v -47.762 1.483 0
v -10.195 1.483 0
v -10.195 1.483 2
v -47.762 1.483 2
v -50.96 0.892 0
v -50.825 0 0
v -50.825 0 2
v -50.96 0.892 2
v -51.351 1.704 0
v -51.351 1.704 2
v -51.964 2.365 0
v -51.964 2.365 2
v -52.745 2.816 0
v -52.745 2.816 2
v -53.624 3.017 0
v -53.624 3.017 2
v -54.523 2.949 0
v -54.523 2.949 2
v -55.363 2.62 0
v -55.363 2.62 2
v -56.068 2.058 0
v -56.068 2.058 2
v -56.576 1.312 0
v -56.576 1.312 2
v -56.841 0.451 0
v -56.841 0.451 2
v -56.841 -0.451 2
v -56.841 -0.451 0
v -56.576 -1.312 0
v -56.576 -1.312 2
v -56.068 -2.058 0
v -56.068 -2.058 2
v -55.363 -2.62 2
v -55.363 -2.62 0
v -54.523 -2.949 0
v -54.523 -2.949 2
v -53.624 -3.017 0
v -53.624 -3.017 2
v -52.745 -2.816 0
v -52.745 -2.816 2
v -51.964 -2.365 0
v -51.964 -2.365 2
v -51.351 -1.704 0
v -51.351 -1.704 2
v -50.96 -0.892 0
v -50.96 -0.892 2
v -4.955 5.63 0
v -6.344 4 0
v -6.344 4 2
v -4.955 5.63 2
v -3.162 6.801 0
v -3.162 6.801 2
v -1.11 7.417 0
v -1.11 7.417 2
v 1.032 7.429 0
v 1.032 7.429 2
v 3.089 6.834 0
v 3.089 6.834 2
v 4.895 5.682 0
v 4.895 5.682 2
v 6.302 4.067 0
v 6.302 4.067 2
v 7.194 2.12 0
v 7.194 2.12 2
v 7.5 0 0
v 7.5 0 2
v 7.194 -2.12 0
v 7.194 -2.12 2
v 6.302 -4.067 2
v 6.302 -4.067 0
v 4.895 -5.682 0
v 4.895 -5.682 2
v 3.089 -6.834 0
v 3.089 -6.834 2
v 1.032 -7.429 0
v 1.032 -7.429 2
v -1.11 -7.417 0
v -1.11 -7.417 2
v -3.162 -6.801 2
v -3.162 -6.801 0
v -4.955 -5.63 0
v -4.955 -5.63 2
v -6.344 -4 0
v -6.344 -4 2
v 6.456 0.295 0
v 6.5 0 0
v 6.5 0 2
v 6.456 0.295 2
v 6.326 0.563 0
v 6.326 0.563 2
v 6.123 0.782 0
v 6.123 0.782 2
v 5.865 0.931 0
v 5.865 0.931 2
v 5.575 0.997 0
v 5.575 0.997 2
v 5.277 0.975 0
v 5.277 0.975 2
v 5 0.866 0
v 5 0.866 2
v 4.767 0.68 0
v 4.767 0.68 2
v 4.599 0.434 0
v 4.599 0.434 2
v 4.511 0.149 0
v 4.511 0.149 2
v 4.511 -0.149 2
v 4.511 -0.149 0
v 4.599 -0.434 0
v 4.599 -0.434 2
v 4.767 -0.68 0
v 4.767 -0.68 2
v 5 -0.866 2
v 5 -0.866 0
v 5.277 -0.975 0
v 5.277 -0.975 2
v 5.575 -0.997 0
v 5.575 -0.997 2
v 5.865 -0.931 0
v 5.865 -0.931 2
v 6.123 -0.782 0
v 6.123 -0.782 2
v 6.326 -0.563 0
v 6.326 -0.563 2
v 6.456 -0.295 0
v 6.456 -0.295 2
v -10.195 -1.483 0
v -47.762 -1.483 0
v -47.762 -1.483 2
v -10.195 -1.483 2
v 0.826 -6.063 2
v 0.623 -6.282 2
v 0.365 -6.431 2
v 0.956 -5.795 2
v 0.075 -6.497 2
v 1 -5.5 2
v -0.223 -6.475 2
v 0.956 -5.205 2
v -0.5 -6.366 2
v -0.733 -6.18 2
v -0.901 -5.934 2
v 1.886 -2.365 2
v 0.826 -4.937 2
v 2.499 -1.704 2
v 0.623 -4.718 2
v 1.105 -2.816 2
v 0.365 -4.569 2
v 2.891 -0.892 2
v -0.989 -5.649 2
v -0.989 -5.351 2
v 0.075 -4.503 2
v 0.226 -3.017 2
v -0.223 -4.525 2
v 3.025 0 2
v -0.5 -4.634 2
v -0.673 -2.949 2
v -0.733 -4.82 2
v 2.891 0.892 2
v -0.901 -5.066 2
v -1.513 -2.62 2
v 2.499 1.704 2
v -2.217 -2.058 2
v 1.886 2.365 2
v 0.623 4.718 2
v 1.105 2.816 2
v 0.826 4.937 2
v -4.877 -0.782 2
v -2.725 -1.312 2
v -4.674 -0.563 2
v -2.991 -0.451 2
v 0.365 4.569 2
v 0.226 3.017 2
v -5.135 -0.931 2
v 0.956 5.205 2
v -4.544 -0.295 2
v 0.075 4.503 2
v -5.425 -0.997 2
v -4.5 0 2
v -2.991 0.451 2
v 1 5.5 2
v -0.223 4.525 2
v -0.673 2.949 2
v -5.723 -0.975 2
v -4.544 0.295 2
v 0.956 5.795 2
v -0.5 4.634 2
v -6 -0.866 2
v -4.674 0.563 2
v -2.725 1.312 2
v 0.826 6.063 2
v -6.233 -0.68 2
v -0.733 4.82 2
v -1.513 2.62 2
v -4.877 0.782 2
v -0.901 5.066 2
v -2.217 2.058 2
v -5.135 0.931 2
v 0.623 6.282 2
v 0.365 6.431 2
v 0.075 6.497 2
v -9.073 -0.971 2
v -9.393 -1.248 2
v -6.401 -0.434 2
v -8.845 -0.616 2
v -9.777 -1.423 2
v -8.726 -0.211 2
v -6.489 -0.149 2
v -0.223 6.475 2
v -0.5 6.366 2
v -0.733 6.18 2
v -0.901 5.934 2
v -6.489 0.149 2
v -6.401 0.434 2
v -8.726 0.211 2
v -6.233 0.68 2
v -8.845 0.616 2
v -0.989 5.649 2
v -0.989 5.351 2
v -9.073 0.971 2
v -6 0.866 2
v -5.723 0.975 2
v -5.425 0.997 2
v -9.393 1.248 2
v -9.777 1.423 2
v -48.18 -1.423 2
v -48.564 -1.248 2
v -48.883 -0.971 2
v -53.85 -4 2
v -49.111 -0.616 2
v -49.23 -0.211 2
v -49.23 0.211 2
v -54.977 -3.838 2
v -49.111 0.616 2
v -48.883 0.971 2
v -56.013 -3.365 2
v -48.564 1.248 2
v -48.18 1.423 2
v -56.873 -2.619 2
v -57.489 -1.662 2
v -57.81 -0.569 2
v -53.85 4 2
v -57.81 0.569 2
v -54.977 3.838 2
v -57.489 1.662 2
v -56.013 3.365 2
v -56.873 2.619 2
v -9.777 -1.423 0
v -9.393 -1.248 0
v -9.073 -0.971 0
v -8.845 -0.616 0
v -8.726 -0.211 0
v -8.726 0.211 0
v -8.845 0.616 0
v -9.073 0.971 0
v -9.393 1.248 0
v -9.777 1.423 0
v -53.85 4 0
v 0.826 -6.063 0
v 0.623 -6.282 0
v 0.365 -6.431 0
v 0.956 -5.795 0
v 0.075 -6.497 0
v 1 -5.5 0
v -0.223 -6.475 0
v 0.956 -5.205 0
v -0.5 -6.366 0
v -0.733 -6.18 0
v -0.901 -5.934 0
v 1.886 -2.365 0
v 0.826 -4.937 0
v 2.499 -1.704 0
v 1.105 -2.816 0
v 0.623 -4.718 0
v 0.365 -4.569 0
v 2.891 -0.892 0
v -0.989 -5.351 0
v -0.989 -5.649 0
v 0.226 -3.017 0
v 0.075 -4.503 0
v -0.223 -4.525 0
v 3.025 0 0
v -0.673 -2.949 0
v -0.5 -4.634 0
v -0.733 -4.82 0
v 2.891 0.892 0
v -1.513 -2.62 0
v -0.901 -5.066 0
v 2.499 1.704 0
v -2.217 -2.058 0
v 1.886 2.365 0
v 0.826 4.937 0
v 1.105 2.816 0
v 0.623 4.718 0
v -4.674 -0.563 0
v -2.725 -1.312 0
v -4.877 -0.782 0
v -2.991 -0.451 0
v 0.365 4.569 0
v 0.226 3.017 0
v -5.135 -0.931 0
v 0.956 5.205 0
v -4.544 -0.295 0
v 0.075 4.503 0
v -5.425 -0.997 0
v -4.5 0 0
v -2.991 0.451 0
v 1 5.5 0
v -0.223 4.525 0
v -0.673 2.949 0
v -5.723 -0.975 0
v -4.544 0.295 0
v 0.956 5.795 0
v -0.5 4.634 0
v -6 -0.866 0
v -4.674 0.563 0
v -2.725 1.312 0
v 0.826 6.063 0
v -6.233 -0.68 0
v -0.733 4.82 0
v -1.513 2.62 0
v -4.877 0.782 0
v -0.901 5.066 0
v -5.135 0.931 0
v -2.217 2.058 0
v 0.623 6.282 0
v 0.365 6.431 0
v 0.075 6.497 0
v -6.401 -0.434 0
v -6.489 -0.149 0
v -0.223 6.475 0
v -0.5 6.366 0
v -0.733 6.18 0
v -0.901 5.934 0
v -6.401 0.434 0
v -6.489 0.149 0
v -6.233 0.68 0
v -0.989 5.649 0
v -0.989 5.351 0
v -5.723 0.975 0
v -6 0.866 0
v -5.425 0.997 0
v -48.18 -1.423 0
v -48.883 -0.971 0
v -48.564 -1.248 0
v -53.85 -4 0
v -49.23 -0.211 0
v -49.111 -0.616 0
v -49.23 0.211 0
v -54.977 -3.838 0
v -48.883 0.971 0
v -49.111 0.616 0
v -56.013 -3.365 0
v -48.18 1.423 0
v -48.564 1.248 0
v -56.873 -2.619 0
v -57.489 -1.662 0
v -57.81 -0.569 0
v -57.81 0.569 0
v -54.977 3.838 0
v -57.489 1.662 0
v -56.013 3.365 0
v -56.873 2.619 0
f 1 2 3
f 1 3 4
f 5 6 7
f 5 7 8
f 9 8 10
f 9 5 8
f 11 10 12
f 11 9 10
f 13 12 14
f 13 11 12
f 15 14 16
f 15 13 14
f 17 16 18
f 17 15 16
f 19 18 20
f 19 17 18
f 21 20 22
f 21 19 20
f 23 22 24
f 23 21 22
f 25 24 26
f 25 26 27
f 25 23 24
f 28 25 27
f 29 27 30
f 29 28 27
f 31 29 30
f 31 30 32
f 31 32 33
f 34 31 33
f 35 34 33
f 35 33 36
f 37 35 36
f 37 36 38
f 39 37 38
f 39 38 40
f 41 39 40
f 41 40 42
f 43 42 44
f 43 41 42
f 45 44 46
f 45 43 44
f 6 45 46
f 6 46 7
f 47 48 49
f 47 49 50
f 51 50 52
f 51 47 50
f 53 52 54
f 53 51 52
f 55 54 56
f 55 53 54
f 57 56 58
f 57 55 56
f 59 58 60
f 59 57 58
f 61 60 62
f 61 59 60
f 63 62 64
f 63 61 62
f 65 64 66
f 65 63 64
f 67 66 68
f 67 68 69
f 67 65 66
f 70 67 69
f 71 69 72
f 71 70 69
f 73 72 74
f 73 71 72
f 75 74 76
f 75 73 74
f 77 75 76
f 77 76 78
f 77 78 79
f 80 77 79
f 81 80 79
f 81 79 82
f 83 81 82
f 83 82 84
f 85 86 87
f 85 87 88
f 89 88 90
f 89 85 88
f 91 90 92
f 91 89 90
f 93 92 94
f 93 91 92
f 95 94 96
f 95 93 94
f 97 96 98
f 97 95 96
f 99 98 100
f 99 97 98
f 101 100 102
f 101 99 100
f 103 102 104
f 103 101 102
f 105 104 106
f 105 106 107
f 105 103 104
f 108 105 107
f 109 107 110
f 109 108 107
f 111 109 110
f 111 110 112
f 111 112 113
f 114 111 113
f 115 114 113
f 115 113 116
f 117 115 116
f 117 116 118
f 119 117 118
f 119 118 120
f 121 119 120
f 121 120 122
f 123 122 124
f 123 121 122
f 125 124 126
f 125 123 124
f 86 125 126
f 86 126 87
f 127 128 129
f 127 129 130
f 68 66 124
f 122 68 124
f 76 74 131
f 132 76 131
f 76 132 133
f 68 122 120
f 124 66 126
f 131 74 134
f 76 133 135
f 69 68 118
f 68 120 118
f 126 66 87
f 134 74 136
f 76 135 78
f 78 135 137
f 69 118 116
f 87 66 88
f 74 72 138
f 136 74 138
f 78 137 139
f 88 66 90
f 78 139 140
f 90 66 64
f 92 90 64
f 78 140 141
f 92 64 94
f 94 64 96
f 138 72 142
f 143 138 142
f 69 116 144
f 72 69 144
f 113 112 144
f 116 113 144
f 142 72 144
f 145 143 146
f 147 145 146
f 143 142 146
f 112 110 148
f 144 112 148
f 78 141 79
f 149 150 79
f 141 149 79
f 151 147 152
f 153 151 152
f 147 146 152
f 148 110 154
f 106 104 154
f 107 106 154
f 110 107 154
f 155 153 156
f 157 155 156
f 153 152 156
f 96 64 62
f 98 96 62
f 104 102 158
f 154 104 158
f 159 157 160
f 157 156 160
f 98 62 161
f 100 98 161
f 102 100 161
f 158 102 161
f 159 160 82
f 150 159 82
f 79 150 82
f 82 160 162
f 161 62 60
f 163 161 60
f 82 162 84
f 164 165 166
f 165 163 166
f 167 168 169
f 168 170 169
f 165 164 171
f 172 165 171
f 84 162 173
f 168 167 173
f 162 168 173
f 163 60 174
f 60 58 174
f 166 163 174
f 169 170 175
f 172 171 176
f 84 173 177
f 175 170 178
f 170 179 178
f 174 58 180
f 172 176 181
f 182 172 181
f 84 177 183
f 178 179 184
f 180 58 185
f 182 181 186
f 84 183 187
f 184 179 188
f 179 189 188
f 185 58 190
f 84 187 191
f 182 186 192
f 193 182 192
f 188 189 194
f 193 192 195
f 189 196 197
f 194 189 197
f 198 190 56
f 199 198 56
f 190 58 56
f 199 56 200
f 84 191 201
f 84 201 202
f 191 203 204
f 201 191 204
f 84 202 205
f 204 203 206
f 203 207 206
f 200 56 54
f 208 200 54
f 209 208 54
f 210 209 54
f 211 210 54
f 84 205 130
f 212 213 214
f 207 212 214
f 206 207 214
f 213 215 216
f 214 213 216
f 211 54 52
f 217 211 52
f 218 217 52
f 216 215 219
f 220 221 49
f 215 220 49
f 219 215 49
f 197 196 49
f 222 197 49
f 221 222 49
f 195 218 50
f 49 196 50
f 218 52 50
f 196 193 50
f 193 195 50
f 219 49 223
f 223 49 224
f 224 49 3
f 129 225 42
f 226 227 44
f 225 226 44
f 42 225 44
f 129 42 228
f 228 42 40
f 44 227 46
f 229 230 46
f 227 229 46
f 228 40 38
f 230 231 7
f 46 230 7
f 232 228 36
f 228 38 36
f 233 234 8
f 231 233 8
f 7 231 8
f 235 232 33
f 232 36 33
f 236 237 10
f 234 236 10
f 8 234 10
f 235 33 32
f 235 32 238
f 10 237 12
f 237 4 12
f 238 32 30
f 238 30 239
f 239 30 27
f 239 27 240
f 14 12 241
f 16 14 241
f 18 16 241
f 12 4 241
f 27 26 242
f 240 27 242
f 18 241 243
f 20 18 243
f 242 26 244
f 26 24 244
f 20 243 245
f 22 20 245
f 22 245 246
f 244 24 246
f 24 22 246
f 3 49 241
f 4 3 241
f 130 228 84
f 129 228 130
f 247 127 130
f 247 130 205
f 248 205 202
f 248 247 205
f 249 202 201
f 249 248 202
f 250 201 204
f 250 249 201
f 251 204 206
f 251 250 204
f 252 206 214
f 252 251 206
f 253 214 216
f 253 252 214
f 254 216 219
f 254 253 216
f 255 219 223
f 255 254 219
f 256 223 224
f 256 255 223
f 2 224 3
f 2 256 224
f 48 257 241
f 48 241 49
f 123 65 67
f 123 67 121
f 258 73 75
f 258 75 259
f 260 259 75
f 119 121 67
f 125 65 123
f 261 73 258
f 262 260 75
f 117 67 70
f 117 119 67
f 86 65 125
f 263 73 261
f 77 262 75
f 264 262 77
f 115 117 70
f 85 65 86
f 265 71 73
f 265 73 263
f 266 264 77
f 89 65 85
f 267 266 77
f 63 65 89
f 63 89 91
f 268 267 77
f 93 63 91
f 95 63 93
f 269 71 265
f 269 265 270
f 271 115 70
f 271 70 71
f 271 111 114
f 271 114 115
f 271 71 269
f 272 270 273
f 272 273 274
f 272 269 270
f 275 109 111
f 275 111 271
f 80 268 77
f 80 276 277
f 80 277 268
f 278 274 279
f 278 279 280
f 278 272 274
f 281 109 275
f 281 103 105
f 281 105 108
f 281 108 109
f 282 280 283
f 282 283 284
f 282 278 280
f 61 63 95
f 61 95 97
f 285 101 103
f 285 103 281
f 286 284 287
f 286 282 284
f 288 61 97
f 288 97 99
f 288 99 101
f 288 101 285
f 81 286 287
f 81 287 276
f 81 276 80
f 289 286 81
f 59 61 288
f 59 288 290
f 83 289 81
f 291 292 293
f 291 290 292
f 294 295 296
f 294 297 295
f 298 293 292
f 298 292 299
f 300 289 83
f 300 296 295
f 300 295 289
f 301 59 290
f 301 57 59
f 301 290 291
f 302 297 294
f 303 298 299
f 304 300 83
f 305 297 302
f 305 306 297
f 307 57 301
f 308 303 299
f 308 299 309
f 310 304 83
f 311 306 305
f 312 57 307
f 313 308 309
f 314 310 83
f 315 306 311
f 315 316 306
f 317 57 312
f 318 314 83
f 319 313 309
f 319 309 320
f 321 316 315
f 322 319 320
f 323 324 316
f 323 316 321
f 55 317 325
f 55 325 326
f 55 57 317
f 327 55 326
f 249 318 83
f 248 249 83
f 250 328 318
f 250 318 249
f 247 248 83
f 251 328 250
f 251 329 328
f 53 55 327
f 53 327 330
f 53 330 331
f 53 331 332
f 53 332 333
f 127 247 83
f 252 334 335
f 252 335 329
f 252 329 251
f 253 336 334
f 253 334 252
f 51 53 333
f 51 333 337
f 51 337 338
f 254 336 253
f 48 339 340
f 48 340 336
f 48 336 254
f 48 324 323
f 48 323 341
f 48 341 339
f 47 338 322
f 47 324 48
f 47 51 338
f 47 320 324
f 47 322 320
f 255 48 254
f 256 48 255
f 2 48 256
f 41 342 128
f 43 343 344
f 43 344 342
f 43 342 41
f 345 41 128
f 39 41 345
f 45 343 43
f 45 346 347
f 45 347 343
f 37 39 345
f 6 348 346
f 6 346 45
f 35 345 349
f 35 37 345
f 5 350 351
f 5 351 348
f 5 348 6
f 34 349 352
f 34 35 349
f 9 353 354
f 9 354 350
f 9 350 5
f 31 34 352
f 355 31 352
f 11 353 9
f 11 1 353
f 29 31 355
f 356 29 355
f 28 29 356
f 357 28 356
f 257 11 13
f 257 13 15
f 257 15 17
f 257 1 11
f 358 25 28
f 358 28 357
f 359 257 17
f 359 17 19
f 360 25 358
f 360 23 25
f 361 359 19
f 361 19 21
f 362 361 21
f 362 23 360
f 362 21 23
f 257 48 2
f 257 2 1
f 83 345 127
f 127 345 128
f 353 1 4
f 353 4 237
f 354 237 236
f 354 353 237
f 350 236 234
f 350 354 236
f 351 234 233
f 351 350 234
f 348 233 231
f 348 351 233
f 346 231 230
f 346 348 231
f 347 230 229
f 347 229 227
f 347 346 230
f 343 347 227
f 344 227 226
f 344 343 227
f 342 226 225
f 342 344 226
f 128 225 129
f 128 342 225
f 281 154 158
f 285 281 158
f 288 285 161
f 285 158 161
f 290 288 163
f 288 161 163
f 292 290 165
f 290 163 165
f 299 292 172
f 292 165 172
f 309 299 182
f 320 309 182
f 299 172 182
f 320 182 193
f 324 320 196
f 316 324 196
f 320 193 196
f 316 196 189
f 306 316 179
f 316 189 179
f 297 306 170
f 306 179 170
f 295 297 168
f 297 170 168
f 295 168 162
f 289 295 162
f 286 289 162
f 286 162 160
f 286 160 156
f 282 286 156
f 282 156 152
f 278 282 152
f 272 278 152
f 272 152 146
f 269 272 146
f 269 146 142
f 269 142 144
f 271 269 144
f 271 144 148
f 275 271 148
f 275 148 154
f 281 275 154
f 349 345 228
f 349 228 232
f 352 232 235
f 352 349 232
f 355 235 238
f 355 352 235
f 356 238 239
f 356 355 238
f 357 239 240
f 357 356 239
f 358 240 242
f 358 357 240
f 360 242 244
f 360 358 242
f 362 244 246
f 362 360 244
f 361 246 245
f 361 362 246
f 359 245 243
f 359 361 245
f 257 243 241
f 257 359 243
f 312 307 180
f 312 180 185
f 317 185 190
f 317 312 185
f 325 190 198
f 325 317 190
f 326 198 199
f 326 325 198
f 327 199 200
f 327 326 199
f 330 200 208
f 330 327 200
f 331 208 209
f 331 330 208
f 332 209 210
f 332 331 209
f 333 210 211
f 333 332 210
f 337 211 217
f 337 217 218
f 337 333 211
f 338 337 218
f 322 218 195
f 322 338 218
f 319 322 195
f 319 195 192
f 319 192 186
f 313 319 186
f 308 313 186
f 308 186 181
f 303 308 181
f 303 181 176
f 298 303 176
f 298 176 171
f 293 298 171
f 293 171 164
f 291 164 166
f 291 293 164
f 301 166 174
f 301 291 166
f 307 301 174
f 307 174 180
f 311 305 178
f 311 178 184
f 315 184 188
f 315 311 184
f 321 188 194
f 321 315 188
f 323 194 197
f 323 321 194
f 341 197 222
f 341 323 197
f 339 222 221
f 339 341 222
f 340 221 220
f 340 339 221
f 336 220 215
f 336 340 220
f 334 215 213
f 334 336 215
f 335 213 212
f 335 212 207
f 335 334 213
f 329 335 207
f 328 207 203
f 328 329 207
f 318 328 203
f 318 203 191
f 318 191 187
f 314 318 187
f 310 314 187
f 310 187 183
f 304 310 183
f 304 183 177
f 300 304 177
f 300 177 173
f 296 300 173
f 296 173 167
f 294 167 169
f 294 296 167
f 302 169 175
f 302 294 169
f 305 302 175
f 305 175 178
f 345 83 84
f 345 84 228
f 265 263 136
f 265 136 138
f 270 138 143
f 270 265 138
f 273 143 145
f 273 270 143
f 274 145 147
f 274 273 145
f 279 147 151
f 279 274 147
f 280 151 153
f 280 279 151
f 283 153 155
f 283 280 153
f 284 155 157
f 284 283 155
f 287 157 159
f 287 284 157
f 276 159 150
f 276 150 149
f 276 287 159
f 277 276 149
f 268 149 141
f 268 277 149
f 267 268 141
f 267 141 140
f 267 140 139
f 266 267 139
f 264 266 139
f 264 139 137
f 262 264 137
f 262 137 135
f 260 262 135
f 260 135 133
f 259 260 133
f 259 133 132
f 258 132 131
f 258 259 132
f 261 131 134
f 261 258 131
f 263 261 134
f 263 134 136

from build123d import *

# Parameters (mm, degrees)
SKETCH_1_R          = 1
SKETCH_1_R_2        = 3.025
SKETCH_1_R_3        = 1.5
EXTRUDE_1_DEPTH     = 2
SKETCH_2_R          = 3.025
CUT_EXTRUDE_1_DEPTH = 10


with BuildPart() as part:
    # 草图1 → 凸台-拉伸1 (new body)
    with BuildSketch(Plane.XY):
        with BuildLine():
            Line((-53.850242828, 4), (-6.34428877, 4))
            ThreePointArc((-6.34428877, 4), (7.5, 0), (-6.34428877, -4))
            Line((-6.34428877, -4), (-53.850242828, -4))
            ThreePointArc((-53.850242828, -4), (-57.850242828, 0), (-53.850242828, 4))
        make_face()
        with Locations((0, 5.5)):
            Circle(SKETCH_1_R, mode=Mode.SUBTRACT)
        with Locations((0, -5.5)):
            Circle(SKETCH_1_R, mode=Mode.SUBTRACT)
        with Locations((-53.850242828, 0)):
            Circle(SKETCH_1_R_2, mode=Mode.SUBTRACT)
        Circle(SKETCH_1_R_3, mode=Mode.SUBTRACT)
        with Locations((-5.5, 0)):
            Circle(SKETCH_1_R, mode=Mode.SUBTRACT)
        with Locations((5.5, 0)):
            Circle(SKETCH_1_R, mode=Mode.SUBTRACT)
        with BuildLine():
            ThreePointArc((-10.194558278, -1.483471582), (-8.711086696, 0), (-10.194558278, 1.483471582))
            Line((-10.194558278, 1.483471582), (-47.761926325, 1.483471582))
            ThreePointArc((-47.761926325, 1.483471582), (-49.245397907, 0), (-47.761926325, -1.483471582))
            Line((-47.761926325, -1.483471582), (-10.194558278, -1.483471582))
        make_face(mode=Mode.SUBTRACT)
    extrude(amount=EXTRUDE_1_DEPTH)

    # 草图2 → 切除-拉伸1 (cut)
    with BuildSketch(Plane.XY.offset(2)):
        Circle(SKETCH_2_R)
    extrude(amount=-CUT_EXTRUDE_1_DEPTH, mode=Mode.SUBTRACT)


solid = part.part
